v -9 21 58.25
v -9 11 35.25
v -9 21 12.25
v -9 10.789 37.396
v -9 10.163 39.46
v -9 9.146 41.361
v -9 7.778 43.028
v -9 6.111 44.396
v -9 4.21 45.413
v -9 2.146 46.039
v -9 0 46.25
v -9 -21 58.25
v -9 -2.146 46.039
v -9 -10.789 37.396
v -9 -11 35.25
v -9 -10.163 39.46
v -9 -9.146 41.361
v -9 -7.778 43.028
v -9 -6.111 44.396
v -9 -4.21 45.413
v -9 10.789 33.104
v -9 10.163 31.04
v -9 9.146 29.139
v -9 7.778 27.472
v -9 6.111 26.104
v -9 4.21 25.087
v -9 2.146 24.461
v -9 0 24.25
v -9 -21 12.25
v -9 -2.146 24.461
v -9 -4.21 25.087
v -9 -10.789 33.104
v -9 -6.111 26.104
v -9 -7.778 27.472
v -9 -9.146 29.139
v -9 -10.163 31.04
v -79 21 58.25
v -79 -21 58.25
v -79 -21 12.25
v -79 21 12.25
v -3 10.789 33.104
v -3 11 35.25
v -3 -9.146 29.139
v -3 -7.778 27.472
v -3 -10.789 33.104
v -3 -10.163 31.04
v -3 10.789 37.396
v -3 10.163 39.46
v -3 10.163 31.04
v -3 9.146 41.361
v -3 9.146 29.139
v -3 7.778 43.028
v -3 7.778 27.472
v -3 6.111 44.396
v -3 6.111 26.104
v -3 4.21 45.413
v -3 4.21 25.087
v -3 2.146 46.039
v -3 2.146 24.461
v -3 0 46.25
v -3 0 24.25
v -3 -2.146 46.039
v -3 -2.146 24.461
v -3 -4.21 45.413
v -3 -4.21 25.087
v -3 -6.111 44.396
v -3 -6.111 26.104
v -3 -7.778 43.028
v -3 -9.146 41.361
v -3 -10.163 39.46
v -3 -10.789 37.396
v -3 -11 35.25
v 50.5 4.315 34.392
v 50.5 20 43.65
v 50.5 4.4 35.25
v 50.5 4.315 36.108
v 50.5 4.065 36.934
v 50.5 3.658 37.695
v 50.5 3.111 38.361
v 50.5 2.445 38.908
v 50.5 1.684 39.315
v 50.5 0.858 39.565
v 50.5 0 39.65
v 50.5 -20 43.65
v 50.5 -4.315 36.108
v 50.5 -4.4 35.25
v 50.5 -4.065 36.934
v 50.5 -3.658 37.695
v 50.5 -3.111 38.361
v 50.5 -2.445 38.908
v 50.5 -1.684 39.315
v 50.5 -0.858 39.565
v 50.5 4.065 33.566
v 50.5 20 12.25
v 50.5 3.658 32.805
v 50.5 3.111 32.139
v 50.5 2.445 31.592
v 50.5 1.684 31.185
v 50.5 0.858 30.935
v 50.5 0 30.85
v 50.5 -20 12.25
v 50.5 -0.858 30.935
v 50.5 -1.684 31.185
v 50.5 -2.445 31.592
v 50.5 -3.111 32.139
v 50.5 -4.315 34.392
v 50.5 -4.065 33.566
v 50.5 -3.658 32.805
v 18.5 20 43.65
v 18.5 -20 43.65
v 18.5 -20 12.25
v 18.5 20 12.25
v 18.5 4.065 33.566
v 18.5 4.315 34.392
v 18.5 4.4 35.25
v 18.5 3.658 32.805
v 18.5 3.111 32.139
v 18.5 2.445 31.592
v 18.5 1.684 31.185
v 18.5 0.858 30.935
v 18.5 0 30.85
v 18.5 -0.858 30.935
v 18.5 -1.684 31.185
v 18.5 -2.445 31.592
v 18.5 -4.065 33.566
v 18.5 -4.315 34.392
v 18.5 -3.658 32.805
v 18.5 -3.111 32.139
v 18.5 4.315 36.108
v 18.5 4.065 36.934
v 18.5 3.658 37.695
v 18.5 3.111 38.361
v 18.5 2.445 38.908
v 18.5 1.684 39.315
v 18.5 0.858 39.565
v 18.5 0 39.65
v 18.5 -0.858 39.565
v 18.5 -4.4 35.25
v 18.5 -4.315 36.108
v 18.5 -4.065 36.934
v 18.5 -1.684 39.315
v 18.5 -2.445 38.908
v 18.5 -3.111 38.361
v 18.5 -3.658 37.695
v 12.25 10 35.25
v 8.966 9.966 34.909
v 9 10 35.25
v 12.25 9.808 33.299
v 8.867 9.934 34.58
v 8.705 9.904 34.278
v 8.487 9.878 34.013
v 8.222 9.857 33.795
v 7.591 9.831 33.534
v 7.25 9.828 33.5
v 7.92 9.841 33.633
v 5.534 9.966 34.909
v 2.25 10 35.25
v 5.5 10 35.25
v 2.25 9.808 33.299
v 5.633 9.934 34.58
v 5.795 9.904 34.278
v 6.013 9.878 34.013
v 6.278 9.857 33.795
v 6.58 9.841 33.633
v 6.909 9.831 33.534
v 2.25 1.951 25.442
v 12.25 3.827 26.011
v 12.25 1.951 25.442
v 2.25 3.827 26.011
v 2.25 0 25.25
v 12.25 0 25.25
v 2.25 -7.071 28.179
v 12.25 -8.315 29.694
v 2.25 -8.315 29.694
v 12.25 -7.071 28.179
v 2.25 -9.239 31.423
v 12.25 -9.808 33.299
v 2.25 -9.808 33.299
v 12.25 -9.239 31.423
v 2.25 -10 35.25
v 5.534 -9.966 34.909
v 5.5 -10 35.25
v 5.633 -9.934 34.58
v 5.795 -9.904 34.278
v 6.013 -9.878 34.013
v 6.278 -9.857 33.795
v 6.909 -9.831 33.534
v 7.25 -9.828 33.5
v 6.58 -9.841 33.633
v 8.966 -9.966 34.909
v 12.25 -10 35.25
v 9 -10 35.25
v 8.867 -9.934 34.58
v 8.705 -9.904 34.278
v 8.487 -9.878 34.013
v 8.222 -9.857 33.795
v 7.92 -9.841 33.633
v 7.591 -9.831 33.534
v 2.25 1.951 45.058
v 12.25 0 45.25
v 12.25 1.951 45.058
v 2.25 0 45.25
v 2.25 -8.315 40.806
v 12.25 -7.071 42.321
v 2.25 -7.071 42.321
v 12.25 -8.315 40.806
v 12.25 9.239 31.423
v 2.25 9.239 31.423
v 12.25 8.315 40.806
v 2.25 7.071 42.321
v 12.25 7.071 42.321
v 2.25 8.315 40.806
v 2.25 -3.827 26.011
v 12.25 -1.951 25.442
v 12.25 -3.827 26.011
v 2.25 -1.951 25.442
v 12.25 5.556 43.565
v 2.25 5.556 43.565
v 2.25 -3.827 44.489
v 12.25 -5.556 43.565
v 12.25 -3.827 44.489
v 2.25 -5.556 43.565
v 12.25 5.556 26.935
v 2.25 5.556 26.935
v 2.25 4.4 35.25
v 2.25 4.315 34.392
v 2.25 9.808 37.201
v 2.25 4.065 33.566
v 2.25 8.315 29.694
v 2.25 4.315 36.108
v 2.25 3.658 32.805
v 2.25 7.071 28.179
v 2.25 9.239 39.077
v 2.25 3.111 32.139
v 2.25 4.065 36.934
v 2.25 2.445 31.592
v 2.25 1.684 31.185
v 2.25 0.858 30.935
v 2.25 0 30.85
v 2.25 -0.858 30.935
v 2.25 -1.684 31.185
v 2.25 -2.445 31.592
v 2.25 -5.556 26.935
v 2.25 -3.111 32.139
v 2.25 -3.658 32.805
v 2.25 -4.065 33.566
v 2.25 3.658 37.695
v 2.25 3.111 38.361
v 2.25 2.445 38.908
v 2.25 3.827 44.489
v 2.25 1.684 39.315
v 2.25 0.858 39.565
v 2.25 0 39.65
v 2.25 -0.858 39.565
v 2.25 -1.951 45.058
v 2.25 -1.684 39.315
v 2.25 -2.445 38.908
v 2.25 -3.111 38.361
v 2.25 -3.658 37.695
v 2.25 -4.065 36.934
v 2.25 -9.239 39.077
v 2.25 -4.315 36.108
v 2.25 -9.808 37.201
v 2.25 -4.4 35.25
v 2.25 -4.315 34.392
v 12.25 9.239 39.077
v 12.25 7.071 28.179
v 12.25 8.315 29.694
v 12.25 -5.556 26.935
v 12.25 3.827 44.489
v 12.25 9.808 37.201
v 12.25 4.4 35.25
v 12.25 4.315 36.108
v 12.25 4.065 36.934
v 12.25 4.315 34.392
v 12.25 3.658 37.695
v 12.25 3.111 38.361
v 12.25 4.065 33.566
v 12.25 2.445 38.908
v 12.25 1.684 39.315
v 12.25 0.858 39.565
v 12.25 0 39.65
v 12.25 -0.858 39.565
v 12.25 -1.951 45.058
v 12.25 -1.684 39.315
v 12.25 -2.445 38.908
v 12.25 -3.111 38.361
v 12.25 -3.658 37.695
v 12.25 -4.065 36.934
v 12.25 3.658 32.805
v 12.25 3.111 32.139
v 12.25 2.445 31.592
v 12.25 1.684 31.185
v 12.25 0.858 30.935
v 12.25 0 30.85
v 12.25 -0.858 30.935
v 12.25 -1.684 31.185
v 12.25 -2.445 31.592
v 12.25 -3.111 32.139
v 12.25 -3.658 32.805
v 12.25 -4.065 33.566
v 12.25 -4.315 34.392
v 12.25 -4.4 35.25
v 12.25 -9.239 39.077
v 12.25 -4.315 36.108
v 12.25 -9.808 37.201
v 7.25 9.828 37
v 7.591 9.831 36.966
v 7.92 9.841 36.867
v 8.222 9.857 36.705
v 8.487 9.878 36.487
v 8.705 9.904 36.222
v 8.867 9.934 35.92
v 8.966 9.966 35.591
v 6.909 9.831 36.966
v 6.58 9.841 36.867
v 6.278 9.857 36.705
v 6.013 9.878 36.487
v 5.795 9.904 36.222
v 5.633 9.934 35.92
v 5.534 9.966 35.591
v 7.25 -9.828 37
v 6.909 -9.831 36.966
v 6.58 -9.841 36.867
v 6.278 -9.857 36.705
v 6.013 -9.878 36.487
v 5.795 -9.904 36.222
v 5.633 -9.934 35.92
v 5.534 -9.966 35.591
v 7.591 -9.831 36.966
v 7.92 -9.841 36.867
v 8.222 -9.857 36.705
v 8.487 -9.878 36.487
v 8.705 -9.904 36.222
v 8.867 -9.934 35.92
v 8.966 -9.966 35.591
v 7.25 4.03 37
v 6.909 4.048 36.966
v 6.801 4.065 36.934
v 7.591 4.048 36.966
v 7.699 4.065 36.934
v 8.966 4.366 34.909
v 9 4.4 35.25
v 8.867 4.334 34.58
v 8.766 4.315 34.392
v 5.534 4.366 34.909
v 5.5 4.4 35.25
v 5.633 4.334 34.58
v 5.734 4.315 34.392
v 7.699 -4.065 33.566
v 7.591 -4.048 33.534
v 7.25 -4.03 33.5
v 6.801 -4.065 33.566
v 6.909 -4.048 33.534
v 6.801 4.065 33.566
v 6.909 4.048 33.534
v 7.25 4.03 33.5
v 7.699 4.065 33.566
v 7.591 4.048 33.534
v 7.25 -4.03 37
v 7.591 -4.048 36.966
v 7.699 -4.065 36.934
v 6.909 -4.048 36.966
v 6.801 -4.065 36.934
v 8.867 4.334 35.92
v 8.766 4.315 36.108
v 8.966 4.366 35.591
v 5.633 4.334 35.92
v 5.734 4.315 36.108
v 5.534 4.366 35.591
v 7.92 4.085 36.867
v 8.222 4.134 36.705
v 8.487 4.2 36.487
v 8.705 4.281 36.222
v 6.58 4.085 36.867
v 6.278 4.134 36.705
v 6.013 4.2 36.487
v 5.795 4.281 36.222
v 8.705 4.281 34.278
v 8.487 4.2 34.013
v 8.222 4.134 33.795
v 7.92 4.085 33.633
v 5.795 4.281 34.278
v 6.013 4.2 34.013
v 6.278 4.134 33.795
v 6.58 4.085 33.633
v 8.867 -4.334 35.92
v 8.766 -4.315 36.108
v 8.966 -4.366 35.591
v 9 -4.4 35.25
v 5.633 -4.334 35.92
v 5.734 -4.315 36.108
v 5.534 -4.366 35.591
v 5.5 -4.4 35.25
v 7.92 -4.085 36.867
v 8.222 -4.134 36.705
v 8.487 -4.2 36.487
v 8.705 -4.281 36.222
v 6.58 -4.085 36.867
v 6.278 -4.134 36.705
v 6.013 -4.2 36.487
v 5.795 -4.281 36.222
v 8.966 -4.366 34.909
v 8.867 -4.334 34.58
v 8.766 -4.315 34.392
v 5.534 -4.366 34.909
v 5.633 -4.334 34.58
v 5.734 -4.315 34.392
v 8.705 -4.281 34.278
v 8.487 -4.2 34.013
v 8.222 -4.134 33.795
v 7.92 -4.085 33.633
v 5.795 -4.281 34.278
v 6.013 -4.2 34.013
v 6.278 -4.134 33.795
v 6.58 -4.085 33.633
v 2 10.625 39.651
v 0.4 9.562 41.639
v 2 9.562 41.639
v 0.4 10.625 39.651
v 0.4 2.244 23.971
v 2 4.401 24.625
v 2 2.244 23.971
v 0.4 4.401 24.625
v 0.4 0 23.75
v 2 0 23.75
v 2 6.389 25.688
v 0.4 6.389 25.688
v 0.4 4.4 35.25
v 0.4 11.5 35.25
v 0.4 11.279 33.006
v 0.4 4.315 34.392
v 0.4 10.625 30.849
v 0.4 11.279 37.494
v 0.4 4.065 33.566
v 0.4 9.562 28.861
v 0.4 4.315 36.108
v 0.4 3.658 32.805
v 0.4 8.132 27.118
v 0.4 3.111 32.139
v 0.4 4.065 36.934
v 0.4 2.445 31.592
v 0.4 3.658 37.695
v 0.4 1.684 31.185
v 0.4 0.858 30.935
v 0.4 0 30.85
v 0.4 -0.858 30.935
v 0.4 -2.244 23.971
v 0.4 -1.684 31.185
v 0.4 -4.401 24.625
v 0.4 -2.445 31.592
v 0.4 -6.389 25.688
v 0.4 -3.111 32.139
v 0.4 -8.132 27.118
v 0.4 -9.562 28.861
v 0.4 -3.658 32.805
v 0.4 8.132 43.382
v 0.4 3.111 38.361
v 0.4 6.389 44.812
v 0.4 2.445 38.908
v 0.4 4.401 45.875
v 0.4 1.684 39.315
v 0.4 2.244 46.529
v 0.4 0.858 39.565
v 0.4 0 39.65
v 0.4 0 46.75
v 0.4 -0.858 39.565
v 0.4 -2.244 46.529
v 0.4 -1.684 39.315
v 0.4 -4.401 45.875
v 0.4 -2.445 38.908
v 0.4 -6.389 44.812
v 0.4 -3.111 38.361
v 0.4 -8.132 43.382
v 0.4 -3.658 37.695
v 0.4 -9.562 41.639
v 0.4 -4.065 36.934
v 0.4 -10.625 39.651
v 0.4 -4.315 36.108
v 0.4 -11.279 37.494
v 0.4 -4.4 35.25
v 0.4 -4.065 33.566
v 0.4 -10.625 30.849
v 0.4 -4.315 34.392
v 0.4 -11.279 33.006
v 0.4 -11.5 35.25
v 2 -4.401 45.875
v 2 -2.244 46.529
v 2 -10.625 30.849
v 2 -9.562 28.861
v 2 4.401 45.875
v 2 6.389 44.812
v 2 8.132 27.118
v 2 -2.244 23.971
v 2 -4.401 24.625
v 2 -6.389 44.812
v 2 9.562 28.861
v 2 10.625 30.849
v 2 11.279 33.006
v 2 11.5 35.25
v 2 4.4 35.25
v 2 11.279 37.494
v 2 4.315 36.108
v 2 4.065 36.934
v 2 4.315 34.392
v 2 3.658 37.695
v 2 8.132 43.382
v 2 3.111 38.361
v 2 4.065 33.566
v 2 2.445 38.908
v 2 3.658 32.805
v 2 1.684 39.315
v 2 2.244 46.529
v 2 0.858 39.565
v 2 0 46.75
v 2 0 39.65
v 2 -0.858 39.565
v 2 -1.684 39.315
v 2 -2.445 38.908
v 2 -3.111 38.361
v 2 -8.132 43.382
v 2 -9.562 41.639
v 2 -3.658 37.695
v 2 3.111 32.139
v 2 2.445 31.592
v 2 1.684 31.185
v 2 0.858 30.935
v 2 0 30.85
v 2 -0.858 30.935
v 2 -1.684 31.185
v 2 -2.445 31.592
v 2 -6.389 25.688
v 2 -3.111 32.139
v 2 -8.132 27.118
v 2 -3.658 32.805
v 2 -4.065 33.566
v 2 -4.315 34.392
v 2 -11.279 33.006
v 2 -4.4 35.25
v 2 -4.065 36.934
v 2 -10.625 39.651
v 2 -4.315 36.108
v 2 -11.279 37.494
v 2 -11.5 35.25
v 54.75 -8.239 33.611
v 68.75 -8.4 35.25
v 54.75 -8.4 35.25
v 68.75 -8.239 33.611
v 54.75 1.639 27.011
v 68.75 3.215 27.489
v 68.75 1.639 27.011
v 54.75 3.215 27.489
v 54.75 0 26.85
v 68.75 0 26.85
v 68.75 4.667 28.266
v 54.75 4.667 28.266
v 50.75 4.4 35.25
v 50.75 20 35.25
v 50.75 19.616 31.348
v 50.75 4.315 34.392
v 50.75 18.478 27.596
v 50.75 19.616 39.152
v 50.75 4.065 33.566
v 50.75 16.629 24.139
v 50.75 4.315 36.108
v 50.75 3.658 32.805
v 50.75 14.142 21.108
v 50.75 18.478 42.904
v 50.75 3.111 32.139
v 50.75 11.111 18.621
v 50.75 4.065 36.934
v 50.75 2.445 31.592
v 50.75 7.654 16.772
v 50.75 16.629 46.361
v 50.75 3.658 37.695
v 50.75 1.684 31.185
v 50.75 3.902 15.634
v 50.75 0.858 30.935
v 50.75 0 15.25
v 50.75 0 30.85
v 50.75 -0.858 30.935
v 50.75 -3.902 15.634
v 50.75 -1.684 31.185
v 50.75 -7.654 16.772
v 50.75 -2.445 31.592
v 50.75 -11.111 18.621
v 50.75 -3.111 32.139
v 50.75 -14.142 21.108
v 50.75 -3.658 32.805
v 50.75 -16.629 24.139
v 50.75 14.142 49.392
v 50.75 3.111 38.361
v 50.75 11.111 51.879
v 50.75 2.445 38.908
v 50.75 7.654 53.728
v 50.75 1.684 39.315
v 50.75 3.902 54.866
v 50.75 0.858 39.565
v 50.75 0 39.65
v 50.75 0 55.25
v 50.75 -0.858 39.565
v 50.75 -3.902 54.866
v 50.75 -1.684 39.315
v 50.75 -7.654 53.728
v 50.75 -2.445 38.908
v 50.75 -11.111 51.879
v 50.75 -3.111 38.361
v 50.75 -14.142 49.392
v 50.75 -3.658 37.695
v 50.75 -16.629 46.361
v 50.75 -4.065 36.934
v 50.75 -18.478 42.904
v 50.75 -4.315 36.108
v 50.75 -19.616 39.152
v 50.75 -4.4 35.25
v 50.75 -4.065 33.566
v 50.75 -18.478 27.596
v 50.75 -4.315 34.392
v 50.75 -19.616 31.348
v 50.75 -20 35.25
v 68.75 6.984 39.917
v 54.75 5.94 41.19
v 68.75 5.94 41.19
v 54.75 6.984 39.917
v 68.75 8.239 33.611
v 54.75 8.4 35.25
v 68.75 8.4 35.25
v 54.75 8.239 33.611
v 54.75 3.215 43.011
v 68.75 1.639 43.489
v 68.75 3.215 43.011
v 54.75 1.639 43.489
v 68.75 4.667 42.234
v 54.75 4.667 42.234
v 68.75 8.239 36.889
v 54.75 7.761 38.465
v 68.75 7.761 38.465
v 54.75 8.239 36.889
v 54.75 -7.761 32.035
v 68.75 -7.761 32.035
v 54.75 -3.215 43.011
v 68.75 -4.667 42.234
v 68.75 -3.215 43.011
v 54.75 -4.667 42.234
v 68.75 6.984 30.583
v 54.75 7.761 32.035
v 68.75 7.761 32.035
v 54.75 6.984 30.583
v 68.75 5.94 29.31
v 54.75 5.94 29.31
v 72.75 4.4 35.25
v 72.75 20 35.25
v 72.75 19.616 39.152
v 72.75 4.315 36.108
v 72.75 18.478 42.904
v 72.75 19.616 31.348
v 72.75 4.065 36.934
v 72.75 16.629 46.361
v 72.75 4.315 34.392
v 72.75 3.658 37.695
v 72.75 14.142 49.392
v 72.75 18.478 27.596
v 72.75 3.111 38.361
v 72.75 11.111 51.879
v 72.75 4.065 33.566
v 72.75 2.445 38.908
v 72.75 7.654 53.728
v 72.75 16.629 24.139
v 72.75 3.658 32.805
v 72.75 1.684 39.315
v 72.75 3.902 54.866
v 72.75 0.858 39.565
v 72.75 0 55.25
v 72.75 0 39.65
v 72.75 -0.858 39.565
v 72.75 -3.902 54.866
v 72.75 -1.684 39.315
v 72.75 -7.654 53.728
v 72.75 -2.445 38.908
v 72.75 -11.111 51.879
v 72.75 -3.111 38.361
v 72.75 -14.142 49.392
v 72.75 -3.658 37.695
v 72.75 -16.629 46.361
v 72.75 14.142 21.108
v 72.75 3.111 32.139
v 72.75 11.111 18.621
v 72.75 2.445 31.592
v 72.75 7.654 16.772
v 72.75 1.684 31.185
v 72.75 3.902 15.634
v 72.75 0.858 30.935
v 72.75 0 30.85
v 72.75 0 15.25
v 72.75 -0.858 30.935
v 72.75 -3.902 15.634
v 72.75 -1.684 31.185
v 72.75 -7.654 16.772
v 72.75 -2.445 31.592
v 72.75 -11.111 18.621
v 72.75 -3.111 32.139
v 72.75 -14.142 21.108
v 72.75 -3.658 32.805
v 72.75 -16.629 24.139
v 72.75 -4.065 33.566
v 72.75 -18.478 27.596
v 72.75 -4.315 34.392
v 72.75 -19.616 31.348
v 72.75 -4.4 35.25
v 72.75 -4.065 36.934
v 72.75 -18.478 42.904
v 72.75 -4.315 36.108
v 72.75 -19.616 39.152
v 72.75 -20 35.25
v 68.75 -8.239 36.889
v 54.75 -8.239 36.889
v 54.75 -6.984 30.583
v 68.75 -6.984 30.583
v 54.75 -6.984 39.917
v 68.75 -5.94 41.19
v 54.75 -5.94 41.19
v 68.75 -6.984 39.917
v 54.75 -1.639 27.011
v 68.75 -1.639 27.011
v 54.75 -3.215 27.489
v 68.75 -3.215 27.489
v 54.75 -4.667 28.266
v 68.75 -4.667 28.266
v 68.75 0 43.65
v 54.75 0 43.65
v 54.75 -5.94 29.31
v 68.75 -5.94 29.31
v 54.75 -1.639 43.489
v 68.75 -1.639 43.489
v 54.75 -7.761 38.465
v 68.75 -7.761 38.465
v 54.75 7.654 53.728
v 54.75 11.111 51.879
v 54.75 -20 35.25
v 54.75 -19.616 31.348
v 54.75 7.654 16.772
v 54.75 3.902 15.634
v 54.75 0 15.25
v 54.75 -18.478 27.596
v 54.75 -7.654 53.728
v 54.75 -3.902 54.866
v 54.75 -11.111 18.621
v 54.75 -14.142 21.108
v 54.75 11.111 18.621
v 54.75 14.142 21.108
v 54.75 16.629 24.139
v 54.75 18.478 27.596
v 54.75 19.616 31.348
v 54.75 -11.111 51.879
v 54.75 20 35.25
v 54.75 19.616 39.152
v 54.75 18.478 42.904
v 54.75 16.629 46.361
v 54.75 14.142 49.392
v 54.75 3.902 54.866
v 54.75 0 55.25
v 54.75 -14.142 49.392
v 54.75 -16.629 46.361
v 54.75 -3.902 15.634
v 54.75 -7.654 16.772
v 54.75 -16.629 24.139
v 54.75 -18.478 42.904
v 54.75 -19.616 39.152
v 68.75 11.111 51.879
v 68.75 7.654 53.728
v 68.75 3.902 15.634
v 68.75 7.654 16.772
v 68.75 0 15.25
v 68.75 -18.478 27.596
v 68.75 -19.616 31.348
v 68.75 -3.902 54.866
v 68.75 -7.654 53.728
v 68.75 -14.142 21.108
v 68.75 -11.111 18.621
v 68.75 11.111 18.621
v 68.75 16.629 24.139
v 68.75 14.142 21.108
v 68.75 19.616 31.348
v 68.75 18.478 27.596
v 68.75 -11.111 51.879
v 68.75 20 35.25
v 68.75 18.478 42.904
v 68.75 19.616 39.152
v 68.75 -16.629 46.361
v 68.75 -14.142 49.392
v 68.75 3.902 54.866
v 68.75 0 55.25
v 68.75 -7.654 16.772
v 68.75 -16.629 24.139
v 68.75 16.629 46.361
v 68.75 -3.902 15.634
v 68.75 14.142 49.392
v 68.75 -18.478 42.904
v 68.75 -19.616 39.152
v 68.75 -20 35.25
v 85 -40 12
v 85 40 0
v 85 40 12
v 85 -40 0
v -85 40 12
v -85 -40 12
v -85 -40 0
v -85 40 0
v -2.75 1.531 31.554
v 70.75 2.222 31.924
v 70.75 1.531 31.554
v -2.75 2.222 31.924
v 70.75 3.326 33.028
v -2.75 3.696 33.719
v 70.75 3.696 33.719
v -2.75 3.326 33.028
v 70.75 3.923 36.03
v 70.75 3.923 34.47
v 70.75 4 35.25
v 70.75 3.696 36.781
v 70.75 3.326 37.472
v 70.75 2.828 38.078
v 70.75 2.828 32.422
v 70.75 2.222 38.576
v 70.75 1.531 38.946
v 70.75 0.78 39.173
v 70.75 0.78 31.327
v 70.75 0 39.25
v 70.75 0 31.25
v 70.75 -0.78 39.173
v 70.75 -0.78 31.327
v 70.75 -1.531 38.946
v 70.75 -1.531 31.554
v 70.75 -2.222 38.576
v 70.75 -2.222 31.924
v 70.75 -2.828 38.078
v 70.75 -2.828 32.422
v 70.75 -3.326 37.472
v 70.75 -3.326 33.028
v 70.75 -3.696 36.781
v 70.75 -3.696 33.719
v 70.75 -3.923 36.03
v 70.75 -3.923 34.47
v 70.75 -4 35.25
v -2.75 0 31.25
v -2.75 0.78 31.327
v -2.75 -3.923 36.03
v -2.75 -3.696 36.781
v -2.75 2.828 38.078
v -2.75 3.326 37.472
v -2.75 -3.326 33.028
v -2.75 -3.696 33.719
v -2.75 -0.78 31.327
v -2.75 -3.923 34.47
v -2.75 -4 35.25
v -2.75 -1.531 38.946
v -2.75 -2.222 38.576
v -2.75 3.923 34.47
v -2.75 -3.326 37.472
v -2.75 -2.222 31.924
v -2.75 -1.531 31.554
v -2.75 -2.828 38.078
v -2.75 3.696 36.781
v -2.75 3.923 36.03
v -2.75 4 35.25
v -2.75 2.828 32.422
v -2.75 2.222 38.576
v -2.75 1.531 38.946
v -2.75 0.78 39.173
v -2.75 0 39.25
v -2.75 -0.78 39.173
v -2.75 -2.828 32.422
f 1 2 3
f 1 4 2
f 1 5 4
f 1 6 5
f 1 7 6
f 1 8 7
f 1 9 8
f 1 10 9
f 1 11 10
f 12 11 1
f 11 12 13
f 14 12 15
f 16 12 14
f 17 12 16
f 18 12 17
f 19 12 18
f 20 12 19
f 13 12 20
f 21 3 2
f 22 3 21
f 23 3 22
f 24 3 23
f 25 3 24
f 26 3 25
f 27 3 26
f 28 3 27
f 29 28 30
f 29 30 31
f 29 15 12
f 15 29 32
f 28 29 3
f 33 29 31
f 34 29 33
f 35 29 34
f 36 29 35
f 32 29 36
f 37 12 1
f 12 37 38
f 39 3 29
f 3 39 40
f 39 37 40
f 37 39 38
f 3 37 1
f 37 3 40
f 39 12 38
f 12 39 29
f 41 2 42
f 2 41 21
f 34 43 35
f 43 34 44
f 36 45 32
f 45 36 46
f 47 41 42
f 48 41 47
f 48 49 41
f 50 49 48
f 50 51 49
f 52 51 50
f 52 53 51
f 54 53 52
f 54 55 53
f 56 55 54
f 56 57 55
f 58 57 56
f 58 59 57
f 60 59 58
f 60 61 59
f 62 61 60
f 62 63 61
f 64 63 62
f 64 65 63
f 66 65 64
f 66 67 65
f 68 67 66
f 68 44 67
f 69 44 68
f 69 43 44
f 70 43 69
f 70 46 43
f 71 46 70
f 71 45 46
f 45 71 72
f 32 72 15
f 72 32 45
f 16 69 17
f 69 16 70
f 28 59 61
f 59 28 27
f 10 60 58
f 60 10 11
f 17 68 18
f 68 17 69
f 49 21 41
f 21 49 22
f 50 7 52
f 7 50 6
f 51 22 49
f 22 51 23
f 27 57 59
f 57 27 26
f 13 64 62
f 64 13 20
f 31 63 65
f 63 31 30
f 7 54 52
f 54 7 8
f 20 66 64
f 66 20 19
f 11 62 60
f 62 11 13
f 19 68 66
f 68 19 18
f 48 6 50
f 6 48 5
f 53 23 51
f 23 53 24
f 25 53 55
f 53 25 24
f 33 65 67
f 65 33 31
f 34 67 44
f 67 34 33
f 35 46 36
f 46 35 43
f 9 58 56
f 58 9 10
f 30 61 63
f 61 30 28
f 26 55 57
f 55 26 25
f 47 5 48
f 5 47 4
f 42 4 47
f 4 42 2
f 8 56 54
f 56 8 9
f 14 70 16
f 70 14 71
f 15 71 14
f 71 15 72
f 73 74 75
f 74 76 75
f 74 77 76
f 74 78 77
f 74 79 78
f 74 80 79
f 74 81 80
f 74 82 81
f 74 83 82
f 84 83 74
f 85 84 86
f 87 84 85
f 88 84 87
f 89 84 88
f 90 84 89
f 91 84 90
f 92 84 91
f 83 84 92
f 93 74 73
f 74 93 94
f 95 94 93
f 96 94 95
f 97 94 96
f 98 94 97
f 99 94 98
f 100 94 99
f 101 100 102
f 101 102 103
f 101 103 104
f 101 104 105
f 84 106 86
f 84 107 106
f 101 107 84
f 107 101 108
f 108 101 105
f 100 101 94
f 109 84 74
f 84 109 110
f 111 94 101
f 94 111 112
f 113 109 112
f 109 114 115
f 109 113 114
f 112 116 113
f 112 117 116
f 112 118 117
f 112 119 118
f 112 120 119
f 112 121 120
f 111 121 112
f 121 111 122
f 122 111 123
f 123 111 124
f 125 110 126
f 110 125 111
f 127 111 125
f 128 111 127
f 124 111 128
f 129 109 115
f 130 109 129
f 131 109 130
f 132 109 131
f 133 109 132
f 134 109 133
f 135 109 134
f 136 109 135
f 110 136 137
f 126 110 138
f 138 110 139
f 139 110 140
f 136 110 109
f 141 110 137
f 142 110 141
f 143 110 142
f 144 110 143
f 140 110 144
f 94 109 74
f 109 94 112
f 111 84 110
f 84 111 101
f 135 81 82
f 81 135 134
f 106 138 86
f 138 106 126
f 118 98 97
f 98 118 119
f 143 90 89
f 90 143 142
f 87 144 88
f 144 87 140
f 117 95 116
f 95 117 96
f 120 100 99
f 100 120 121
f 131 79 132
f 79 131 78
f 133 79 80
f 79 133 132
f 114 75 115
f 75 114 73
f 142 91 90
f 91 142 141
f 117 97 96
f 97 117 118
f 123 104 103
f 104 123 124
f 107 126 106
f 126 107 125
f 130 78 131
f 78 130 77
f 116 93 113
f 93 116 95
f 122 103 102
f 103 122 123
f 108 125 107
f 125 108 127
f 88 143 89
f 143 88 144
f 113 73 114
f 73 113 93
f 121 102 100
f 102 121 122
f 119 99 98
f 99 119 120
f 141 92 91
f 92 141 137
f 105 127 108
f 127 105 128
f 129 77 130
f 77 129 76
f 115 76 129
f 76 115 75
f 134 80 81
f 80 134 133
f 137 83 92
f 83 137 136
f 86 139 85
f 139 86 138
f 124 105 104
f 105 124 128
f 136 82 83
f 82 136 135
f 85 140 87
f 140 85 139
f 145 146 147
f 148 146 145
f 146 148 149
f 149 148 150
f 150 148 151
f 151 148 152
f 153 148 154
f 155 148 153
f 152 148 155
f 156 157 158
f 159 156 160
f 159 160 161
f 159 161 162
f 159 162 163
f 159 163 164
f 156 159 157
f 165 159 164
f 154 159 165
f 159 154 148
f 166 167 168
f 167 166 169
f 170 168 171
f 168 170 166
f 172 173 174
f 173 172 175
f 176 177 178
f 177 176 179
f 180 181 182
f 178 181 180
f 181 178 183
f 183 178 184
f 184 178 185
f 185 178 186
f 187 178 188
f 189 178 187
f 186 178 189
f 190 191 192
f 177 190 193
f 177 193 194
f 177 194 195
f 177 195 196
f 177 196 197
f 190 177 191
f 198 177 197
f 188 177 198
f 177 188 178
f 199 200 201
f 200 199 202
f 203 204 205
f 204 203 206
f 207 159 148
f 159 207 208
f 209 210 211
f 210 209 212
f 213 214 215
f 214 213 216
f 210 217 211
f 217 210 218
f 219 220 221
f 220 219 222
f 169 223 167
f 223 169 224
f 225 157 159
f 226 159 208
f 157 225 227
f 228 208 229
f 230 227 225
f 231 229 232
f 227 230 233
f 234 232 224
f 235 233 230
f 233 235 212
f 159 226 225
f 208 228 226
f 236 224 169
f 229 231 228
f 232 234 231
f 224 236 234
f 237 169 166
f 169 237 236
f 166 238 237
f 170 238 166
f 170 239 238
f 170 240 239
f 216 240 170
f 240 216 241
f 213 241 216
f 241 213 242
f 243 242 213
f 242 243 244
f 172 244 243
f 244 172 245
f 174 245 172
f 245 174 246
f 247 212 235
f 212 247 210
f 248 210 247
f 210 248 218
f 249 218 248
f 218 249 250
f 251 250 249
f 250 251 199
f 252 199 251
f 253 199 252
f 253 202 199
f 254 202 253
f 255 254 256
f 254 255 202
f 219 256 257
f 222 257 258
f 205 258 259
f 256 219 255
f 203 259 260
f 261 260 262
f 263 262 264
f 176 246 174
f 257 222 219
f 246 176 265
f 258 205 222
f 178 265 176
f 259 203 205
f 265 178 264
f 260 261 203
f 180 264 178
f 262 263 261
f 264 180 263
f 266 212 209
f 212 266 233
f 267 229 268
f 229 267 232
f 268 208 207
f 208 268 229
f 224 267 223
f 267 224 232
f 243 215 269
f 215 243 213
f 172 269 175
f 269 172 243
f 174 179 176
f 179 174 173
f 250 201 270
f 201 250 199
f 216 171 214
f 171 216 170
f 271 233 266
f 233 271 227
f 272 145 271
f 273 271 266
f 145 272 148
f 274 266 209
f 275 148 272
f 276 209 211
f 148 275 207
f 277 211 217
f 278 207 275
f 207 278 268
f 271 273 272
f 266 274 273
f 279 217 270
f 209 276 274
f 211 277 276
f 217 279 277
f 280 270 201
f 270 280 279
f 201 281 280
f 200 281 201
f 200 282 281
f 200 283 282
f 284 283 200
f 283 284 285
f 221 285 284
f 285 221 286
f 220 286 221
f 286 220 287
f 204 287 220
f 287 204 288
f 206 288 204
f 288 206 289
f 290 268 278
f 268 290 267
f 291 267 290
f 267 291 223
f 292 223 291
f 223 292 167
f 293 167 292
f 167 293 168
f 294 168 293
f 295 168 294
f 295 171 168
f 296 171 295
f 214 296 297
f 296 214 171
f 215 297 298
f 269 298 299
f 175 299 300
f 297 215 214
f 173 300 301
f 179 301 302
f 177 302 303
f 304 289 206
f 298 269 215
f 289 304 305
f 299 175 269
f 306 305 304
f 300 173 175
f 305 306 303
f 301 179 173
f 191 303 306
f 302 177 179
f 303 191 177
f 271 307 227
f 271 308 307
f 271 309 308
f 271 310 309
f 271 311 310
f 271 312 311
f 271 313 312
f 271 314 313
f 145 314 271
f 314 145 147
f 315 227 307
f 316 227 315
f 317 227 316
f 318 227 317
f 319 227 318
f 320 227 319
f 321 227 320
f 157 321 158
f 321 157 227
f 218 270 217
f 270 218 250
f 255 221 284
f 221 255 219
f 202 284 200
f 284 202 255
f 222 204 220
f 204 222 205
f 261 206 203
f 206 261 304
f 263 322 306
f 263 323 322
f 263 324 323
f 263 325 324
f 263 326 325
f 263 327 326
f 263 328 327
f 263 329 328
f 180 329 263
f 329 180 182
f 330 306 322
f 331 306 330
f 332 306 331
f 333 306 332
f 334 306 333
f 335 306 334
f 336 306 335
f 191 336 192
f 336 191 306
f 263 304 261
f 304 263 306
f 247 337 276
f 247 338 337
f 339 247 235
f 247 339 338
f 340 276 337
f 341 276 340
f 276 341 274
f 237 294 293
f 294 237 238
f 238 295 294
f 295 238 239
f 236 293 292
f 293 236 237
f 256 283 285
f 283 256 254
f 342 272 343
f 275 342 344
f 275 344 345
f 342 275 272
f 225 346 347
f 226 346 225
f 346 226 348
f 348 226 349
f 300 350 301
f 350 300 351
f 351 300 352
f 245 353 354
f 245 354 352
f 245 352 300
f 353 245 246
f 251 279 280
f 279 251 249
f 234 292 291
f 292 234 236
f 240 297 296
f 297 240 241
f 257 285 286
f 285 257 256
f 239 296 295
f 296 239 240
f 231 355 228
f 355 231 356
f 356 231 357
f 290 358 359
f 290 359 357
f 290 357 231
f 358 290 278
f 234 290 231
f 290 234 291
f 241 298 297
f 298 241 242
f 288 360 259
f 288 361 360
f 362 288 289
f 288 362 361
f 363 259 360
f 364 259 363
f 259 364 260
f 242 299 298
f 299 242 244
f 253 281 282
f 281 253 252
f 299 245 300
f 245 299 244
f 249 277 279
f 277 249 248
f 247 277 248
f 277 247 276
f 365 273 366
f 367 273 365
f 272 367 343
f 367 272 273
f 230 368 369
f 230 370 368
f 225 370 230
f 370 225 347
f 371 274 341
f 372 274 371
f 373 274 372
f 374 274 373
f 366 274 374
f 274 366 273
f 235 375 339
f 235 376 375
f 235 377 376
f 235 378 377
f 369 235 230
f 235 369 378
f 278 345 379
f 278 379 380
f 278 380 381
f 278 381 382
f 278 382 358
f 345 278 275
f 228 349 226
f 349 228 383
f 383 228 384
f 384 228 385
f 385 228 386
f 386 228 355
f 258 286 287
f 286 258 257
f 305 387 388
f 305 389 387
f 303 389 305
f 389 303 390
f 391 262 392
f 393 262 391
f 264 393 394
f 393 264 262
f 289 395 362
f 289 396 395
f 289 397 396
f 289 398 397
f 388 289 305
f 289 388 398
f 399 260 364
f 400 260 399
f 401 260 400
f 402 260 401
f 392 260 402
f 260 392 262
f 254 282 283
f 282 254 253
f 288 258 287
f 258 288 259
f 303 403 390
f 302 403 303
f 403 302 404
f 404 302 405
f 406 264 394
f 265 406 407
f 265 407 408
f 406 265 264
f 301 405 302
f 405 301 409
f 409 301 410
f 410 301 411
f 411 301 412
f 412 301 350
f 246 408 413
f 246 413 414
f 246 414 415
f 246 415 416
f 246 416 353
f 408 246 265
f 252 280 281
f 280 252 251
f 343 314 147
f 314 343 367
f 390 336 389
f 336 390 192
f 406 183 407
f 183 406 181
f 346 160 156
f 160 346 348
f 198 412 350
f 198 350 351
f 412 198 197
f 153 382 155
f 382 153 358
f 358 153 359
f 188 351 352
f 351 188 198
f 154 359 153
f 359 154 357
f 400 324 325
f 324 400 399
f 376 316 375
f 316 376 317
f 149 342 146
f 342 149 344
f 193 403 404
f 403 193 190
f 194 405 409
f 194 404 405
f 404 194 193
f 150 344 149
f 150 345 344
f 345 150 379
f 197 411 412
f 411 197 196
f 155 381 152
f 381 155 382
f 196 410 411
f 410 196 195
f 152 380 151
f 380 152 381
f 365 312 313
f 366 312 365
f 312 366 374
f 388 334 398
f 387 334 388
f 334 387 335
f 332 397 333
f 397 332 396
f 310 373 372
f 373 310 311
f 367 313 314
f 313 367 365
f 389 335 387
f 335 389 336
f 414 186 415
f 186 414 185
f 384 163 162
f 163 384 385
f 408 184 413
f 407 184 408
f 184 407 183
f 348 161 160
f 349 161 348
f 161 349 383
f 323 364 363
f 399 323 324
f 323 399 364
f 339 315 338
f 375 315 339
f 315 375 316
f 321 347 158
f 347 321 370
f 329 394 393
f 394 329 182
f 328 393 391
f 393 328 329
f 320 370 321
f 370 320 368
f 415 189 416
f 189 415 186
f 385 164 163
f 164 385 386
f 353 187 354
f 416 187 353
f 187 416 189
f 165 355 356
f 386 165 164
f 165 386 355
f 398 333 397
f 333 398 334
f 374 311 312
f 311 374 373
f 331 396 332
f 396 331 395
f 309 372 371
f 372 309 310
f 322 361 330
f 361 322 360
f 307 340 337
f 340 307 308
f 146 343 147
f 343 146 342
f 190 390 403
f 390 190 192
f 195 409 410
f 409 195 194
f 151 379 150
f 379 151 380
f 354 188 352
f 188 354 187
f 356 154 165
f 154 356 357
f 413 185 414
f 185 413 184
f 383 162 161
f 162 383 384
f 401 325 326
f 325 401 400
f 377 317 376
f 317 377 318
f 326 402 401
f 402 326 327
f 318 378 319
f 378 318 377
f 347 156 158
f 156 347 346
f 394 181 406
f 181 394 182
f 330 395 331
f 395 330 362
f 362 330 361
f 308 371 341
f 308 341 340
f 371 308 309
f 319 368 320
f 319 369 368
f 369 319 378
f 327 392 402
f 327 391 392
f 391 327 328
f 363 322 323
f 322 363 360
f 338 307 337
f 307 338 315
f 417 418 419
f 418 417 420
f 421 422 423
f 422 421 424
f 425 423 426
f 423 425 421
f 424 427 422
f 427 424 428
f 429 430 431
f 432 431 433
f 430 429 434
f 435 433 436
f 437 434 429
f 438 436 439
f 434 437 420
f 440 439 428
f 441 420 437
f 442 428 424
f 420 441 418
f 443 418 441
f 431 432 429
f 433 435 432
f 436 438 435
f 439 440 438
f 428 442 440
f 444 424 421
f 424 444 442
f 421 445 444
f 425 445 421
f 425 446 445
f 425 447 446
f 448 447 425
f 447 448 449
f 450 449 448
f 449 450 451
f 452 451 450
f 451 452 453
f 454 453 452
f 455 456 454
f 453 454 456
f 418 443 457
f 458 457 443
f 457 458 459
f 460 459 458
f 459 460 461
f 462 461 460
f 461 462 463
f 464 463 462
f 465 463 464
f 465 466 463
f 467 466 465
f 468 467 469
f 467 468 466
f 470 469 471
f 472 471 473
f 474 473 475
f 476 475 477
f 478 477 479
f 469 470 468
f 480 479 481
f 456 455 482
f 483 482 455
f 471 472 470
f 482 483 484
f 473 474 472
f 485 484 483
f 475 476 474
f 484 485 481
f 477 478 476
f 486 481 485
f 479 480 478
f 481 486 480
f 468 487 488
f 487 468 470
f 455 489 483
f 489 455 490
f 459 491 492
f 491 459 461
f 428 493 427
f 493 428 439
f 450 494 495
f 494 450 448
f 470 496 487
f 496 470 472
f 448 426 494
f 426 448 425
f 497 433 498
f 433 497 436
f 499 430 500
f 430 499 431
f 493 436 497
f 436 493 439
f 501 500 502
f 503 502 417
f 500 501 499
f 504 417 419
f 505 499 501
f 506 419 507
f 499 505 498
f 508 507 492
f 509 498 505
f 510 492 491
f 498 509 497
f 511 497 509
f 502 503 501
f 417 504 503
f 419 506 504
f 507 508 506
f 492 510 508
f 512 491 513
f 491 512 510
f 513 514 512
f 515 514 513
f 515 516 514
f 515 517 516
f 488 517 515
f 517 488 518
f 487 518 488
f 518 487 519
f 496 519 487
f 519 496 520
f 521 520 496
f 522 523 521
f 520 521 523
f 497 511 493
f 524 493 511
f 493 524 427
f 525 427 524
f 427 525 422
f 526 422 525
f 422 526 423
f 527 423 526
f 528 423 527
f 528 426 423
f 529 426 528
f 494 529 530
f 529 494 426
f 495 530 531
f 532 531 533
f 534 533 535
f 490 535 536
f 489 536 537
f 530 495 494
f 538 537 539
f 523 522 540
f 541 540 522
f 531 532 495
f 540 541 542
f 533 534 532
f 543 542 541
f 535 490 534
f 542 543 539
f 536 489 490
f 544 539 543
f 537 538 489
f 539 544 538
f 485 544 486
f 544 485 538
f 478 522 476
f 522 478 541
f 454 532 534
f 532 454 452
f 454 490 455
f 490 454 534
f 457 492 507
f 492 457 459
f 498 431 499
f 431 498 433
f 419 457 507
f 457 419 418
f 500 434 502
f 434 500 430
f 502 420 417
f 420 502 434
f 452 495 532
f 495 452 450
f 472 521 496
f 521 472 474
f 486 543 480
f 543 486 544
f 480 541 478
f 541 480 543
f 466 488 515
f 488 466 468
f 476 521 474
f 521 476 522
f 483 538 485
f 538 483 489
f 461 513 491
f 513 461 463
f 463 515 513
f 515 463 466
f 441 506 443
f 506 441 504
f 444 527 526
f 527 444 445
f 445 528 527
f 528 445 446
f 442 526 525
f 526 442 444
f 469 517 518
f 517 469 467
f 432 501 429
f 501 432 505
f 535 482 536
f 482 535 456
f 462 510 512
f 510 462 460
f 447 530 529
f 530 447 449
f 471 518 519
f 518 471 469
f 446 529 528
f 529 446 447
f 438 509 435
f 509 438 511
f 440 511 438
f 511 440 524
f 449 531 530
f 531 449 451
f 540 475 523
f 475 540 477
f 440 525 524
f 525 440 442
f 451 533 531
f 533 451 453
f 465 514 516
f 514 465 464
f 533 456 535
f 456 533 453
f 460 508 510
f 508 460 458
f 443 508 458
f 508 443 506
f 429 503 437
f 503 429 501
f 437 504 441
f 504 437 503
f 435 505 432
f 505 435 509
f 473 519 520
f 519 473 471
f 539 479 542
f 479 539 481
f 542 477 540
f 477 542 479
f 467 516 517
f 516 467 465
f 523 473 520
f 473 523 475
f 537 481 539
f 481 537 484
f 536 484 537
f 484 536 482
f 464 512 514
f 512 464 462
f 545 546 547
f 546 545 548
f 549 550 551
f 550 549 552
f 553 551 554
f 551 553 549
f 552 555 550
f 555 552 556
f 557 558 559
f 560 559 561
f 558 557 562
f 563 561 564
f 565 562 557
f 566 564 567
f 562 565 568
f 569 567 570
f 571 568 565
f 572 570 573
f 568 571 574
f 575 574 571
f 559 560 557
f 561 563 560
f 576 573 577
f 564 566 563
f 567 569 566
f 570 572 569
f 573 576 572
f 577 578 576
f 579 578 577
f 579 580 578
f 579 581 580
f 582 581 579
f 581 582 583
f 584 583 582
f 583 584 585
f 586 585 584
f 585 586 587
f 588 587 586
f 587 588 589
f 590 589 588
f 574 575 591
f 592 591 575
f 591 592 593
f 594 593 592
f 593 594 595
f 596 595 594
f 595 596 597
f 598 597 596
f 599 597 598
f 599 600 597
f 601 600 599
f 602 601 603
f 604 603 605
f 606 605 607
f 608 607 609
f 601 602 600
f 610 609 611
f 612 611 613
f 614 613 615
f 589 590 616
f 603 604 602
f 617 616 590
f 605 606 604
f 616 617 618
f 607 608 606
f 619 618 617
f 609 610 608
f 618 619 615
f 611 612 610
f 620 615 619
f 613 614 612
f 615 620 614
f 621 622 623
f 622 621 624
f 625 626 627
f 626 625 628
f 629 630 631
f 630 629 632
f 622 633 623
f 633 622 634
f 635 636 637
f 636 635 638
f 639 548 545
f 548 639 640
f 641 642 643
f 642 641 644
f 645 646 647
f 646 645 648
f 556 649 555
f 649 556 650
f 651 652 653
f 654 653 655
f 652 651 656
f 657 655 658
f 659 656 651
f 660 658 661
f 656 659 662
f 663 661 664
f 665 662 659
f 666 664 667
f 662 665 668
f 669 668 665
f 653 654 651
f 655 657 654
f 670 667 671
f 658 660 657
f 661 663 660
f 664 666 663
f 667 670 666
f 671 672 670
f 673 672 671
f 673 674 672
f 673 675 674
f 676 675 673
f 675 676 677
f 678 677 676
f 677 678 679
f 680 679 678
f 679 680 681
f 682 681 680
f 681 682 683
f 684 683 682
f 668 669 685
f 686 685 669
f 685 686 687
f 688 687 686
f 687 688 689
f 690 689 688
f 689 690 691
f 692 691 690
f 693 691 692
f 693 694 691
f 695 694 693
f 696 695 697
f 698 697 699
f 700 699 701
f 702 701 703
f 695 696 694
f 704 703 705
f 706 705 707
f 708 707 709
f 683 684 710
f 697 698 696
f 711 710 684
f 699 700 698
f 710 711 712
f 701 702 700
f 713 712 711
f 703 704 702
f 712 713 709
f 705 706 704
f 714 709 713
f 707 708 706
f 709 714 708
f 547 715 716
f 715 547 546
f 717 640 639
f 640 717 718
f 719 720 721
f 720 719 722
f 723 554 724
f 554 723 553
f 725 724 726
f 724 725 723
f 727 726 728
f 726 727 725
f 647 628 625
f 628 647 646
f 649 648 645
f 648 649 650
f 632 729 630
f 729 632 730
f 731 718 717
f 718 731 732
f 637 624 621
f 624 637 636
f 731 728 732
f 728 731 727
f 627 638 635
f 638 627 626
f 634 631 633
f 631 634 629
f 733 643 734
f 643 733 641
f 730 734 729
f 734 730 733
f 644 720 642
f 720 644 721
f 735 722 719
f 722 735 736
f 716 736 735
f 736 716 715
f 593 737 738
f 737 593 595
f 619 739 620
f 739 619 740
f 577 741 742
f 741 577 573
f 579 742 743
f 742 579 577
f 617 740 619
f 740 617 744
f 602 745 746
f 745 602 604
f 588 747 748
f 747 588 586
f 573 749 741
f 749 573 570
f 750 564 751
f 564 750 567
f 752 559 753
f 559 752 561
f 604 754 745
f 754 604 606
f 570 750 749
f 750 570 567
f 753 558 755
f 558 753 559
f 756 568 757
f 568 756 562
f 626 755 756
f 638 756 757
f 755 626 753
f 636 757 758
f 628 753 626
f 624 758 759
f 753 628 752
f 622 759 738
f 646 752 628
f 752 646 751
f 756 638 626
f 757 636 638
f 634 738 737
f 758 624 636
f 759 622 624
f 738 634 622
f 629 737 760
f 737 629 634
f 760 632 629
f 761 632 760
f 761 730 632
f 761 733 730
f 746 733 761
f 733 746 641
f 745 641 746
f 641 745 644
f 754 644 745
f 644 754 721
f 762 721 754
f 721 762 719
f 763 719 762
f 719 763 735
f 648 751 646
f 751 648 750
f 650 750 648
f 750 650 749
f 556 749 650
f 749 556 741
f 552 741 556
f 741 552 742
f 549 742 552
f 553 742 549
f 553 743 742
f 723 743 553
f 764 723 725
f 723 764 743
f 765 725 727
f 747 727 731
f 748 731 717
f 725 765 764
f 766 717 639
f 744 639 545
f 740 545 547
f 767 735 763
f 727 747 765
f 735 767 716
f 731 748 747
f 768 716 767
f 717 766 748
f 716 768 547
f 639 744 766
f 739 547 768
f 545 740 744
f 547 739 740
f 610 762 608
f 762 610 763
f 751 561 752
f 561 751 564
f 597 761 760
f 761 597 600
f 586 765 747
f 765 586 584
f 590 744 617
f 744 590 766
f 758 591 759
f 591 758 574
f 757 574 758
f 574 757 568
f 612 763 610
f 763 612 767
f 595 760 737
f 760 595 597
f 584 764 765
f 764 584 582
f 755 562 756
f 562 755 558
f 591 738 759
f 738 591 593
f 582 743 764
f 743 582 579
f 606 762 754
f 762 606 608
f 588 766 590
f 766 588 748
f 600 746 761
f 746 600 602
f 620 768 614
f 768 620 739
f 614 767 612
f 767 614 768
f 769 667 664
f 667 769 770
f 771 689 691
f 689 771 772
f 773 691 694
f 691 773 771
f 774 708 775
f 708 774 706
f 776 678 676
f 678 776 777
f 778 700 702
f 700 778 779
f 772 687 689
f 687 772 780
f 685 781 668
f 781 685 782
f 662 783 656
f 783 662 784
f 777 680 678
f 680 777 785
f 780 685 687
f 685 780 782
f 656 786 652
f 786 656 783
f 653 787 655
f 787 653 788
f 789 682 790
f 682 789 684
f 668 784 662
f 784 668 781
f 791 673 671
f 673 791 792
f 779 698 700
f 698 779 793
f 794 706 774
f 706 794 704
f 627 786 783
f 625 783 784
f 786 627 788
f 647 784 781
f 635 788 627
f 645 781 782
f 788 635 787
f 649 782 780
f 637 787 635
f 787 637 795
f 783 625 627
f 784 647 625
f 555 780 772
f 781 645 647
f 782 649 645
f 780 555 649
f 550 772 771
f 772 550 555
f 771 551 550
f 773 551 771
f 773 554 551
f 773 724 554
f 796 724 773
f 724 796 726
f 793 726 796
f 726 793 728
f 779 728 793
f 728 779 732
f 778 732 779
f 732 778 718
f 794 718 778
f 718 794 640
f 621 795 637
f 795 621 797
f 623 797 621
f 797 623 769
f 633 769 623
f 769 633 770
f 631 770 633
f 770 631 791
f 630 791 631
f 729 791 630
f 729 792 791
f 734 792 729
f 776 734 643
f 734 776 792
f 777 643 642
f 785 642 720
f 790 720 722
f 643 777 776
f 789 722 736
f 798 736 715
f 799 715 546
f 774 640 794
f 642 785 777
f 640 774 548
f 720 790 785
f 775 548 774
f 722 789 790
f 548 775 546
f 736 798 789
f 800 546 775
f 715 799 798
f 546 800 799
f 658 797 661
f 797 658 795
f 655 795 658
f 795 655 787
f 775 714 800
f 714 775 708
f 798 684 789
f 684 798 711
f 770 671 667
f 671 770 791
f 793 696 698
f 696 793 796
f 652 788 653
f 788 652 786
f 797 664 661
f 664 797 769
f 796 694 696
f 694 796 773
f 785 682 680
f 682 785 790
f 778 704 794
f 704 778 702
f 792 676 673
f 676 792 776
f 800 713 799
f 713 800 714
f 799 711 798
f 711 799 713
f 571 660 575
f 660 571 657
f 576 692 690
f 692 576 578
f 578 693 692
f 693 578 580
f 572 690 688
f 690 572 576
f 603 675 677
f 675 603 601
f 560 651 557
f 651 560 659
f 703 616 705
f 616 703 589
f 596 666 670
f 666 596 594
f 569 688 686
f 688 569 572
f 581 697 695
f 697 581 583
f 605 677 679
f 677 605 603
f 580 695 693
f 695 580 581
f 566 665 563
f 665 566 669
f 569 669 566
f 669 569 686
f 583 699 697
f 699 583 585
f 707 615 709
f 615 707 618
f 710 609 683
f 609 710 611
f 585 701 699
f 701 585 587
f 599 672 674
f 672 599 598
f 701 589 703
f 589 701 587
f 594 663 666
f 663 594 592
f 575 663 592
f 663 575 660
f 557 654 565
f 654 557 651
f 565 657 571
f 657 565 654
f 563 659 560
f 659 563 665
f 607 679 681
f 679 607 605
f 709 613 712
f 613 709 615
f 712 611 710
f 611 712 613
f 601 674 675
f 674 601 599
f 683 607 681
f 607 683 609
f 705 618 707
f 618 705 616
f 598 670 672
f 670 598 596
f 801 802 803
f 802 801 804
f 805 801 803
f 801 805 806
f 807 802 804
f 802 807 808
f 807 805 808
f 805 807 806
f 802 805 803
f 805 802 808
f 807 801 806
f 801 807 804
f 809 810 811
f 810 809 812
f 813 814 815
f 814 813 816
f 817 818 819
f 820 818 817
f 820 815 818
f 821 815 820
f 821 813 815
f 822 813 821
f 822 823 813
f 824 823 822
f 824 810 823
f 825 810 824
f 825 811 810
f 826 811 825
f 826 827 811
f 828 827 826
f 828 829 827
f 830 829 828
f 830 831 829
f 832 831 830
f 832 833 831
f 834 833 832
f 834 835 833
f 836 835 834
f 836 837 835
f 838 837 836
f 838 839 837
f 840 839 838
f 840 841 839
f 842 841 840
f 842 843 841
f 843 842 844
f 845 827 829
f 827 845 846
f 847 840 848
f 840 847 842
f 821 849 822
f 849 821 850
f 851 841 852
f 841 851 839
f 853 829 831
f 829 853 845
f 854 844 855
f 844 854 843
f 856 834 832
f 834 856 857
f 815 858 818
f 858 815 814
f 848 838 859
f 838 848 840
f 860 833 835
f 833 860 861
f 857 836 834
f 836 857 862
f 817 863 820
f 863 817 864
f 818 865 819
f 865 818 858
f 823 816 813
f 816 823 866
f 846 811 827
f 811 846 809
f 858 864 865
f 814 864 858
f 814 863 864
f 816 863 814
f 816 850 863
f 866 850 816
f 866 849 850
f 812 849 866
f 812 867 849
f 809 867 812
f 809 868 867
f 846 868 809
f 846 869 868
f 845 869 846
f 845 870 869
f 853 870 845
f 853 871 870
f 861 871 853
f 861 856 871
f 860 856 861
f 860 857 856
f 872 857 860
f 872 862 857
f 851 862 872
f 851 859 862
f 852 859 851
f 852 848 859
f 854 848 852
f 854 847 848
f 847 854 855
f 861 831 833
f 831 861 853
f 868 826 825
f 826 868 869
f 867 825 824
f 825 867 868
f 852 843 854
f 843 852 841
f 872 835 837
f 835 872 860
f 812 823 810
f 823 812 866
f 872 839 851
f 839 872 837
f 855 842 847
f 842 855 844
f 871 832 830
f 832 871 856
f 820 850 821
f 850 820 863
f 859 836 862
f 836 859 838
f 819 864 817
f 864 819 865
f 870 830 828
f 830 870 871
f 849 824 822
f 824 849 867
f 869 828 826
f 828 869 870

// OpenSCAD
$fn = 32;

// ------------------------------------------------------------------------
// Motor drive station: motor 70 x 46 mm, shaft d8, pulley d40
// Every part is its own module, assembly() places every instance.
// ------------------------------------------------------------------------

// --- part 1 ---
module station_bed() {
  difference() {
    translate([-85, -40, 0]) cube([170, 80, 12]);
  }
}

// --- part 2 ---
module drive_motor() {
  union() {
    translate([-35, -21, 0]) cube([70, 42, 46]);
    translate([38, 0, 23]) rotate([0, 90, 0]) cylinder(h = 6, d = 22, center = true);
  }
}

// --- part 3 ---
module pillow_block() {
  difference() {
    translate([-16, -20, 0]) cube([32, 40, 31.4]);
    translate([0, 0, 23]) rotate([0, 90, 0]) cylinder(h = 34, d = 8.8, center = true);
  }
}

// --- part 4 ---
module drive_shaft() {
  translate([0, 0, -36.75]) cylinder(h = 73.5, d = 8);
}

// --- part 5 ---
module shaft_collar() {
  difference() {
    cylinder(h = 10, d = 20);
    translate([0, 0, -1]) cylinder(h = 12, d = 8.8);
    translate([0, 0, 5]) rotate([90, 0, 0]) cylinder(h = 22, d = 3.5, center = true);
  }
}

// --- part 6 ---
module collar_washer() {
  difference() {
      translate([0, 0, 0]) cylinder(h = 1.6, d = 23);
      translate([0, 0, -1]) cylinder(h = 3.6, d = 8.8);
    }
}

// --- part 7 ---
module drive_pulley() {
  difference() {
    union() {
      cylinder(h = 22, d = 16.8);
      cylinder(h = 4, d = 40);
      translate([0, 0, 18]) cylinder(h = 4, d = 40);
    }
    translate([0, 0, -1]) cylinder(h = 24, d = 8.8);
  }
}

// --- assembly ---
module assembly() {
  color([0.80, 0.24, 0.20]) translate([0, 0, 0]) rotate([0, 0, 0]) station_bed();
  color([0.20, 0.45, 0.75]) translate([-44, 0, 12.25]) rotate([0, 0, 0]) drive_motor();
  color([0.25, 0.62, 0.32]) translate([34.5, 0, 12.25]) rotate([0, 0, 0]) pillow_block();
  color([0.92, 0.70, 0.18]) translate([34, 0, 35.25]) rotate([0, 90, 0]) drive_shaft();
  color([0.58, 0.35, 0.70]) translate([2.25, 0, 35.25]) rotate([0, 90, 0]) shaft_collar();
  color([0.16, 0.66, 0.66]) translate([0.4, 0, 35.25]) rotate([0, 90, 0]) collar_washer();
  color([0.85, 0.48, 0.18]) translate([50.75, 0, 35.25]) rotate([0, 90, 0]) drive_pulley();
}

assembly();
